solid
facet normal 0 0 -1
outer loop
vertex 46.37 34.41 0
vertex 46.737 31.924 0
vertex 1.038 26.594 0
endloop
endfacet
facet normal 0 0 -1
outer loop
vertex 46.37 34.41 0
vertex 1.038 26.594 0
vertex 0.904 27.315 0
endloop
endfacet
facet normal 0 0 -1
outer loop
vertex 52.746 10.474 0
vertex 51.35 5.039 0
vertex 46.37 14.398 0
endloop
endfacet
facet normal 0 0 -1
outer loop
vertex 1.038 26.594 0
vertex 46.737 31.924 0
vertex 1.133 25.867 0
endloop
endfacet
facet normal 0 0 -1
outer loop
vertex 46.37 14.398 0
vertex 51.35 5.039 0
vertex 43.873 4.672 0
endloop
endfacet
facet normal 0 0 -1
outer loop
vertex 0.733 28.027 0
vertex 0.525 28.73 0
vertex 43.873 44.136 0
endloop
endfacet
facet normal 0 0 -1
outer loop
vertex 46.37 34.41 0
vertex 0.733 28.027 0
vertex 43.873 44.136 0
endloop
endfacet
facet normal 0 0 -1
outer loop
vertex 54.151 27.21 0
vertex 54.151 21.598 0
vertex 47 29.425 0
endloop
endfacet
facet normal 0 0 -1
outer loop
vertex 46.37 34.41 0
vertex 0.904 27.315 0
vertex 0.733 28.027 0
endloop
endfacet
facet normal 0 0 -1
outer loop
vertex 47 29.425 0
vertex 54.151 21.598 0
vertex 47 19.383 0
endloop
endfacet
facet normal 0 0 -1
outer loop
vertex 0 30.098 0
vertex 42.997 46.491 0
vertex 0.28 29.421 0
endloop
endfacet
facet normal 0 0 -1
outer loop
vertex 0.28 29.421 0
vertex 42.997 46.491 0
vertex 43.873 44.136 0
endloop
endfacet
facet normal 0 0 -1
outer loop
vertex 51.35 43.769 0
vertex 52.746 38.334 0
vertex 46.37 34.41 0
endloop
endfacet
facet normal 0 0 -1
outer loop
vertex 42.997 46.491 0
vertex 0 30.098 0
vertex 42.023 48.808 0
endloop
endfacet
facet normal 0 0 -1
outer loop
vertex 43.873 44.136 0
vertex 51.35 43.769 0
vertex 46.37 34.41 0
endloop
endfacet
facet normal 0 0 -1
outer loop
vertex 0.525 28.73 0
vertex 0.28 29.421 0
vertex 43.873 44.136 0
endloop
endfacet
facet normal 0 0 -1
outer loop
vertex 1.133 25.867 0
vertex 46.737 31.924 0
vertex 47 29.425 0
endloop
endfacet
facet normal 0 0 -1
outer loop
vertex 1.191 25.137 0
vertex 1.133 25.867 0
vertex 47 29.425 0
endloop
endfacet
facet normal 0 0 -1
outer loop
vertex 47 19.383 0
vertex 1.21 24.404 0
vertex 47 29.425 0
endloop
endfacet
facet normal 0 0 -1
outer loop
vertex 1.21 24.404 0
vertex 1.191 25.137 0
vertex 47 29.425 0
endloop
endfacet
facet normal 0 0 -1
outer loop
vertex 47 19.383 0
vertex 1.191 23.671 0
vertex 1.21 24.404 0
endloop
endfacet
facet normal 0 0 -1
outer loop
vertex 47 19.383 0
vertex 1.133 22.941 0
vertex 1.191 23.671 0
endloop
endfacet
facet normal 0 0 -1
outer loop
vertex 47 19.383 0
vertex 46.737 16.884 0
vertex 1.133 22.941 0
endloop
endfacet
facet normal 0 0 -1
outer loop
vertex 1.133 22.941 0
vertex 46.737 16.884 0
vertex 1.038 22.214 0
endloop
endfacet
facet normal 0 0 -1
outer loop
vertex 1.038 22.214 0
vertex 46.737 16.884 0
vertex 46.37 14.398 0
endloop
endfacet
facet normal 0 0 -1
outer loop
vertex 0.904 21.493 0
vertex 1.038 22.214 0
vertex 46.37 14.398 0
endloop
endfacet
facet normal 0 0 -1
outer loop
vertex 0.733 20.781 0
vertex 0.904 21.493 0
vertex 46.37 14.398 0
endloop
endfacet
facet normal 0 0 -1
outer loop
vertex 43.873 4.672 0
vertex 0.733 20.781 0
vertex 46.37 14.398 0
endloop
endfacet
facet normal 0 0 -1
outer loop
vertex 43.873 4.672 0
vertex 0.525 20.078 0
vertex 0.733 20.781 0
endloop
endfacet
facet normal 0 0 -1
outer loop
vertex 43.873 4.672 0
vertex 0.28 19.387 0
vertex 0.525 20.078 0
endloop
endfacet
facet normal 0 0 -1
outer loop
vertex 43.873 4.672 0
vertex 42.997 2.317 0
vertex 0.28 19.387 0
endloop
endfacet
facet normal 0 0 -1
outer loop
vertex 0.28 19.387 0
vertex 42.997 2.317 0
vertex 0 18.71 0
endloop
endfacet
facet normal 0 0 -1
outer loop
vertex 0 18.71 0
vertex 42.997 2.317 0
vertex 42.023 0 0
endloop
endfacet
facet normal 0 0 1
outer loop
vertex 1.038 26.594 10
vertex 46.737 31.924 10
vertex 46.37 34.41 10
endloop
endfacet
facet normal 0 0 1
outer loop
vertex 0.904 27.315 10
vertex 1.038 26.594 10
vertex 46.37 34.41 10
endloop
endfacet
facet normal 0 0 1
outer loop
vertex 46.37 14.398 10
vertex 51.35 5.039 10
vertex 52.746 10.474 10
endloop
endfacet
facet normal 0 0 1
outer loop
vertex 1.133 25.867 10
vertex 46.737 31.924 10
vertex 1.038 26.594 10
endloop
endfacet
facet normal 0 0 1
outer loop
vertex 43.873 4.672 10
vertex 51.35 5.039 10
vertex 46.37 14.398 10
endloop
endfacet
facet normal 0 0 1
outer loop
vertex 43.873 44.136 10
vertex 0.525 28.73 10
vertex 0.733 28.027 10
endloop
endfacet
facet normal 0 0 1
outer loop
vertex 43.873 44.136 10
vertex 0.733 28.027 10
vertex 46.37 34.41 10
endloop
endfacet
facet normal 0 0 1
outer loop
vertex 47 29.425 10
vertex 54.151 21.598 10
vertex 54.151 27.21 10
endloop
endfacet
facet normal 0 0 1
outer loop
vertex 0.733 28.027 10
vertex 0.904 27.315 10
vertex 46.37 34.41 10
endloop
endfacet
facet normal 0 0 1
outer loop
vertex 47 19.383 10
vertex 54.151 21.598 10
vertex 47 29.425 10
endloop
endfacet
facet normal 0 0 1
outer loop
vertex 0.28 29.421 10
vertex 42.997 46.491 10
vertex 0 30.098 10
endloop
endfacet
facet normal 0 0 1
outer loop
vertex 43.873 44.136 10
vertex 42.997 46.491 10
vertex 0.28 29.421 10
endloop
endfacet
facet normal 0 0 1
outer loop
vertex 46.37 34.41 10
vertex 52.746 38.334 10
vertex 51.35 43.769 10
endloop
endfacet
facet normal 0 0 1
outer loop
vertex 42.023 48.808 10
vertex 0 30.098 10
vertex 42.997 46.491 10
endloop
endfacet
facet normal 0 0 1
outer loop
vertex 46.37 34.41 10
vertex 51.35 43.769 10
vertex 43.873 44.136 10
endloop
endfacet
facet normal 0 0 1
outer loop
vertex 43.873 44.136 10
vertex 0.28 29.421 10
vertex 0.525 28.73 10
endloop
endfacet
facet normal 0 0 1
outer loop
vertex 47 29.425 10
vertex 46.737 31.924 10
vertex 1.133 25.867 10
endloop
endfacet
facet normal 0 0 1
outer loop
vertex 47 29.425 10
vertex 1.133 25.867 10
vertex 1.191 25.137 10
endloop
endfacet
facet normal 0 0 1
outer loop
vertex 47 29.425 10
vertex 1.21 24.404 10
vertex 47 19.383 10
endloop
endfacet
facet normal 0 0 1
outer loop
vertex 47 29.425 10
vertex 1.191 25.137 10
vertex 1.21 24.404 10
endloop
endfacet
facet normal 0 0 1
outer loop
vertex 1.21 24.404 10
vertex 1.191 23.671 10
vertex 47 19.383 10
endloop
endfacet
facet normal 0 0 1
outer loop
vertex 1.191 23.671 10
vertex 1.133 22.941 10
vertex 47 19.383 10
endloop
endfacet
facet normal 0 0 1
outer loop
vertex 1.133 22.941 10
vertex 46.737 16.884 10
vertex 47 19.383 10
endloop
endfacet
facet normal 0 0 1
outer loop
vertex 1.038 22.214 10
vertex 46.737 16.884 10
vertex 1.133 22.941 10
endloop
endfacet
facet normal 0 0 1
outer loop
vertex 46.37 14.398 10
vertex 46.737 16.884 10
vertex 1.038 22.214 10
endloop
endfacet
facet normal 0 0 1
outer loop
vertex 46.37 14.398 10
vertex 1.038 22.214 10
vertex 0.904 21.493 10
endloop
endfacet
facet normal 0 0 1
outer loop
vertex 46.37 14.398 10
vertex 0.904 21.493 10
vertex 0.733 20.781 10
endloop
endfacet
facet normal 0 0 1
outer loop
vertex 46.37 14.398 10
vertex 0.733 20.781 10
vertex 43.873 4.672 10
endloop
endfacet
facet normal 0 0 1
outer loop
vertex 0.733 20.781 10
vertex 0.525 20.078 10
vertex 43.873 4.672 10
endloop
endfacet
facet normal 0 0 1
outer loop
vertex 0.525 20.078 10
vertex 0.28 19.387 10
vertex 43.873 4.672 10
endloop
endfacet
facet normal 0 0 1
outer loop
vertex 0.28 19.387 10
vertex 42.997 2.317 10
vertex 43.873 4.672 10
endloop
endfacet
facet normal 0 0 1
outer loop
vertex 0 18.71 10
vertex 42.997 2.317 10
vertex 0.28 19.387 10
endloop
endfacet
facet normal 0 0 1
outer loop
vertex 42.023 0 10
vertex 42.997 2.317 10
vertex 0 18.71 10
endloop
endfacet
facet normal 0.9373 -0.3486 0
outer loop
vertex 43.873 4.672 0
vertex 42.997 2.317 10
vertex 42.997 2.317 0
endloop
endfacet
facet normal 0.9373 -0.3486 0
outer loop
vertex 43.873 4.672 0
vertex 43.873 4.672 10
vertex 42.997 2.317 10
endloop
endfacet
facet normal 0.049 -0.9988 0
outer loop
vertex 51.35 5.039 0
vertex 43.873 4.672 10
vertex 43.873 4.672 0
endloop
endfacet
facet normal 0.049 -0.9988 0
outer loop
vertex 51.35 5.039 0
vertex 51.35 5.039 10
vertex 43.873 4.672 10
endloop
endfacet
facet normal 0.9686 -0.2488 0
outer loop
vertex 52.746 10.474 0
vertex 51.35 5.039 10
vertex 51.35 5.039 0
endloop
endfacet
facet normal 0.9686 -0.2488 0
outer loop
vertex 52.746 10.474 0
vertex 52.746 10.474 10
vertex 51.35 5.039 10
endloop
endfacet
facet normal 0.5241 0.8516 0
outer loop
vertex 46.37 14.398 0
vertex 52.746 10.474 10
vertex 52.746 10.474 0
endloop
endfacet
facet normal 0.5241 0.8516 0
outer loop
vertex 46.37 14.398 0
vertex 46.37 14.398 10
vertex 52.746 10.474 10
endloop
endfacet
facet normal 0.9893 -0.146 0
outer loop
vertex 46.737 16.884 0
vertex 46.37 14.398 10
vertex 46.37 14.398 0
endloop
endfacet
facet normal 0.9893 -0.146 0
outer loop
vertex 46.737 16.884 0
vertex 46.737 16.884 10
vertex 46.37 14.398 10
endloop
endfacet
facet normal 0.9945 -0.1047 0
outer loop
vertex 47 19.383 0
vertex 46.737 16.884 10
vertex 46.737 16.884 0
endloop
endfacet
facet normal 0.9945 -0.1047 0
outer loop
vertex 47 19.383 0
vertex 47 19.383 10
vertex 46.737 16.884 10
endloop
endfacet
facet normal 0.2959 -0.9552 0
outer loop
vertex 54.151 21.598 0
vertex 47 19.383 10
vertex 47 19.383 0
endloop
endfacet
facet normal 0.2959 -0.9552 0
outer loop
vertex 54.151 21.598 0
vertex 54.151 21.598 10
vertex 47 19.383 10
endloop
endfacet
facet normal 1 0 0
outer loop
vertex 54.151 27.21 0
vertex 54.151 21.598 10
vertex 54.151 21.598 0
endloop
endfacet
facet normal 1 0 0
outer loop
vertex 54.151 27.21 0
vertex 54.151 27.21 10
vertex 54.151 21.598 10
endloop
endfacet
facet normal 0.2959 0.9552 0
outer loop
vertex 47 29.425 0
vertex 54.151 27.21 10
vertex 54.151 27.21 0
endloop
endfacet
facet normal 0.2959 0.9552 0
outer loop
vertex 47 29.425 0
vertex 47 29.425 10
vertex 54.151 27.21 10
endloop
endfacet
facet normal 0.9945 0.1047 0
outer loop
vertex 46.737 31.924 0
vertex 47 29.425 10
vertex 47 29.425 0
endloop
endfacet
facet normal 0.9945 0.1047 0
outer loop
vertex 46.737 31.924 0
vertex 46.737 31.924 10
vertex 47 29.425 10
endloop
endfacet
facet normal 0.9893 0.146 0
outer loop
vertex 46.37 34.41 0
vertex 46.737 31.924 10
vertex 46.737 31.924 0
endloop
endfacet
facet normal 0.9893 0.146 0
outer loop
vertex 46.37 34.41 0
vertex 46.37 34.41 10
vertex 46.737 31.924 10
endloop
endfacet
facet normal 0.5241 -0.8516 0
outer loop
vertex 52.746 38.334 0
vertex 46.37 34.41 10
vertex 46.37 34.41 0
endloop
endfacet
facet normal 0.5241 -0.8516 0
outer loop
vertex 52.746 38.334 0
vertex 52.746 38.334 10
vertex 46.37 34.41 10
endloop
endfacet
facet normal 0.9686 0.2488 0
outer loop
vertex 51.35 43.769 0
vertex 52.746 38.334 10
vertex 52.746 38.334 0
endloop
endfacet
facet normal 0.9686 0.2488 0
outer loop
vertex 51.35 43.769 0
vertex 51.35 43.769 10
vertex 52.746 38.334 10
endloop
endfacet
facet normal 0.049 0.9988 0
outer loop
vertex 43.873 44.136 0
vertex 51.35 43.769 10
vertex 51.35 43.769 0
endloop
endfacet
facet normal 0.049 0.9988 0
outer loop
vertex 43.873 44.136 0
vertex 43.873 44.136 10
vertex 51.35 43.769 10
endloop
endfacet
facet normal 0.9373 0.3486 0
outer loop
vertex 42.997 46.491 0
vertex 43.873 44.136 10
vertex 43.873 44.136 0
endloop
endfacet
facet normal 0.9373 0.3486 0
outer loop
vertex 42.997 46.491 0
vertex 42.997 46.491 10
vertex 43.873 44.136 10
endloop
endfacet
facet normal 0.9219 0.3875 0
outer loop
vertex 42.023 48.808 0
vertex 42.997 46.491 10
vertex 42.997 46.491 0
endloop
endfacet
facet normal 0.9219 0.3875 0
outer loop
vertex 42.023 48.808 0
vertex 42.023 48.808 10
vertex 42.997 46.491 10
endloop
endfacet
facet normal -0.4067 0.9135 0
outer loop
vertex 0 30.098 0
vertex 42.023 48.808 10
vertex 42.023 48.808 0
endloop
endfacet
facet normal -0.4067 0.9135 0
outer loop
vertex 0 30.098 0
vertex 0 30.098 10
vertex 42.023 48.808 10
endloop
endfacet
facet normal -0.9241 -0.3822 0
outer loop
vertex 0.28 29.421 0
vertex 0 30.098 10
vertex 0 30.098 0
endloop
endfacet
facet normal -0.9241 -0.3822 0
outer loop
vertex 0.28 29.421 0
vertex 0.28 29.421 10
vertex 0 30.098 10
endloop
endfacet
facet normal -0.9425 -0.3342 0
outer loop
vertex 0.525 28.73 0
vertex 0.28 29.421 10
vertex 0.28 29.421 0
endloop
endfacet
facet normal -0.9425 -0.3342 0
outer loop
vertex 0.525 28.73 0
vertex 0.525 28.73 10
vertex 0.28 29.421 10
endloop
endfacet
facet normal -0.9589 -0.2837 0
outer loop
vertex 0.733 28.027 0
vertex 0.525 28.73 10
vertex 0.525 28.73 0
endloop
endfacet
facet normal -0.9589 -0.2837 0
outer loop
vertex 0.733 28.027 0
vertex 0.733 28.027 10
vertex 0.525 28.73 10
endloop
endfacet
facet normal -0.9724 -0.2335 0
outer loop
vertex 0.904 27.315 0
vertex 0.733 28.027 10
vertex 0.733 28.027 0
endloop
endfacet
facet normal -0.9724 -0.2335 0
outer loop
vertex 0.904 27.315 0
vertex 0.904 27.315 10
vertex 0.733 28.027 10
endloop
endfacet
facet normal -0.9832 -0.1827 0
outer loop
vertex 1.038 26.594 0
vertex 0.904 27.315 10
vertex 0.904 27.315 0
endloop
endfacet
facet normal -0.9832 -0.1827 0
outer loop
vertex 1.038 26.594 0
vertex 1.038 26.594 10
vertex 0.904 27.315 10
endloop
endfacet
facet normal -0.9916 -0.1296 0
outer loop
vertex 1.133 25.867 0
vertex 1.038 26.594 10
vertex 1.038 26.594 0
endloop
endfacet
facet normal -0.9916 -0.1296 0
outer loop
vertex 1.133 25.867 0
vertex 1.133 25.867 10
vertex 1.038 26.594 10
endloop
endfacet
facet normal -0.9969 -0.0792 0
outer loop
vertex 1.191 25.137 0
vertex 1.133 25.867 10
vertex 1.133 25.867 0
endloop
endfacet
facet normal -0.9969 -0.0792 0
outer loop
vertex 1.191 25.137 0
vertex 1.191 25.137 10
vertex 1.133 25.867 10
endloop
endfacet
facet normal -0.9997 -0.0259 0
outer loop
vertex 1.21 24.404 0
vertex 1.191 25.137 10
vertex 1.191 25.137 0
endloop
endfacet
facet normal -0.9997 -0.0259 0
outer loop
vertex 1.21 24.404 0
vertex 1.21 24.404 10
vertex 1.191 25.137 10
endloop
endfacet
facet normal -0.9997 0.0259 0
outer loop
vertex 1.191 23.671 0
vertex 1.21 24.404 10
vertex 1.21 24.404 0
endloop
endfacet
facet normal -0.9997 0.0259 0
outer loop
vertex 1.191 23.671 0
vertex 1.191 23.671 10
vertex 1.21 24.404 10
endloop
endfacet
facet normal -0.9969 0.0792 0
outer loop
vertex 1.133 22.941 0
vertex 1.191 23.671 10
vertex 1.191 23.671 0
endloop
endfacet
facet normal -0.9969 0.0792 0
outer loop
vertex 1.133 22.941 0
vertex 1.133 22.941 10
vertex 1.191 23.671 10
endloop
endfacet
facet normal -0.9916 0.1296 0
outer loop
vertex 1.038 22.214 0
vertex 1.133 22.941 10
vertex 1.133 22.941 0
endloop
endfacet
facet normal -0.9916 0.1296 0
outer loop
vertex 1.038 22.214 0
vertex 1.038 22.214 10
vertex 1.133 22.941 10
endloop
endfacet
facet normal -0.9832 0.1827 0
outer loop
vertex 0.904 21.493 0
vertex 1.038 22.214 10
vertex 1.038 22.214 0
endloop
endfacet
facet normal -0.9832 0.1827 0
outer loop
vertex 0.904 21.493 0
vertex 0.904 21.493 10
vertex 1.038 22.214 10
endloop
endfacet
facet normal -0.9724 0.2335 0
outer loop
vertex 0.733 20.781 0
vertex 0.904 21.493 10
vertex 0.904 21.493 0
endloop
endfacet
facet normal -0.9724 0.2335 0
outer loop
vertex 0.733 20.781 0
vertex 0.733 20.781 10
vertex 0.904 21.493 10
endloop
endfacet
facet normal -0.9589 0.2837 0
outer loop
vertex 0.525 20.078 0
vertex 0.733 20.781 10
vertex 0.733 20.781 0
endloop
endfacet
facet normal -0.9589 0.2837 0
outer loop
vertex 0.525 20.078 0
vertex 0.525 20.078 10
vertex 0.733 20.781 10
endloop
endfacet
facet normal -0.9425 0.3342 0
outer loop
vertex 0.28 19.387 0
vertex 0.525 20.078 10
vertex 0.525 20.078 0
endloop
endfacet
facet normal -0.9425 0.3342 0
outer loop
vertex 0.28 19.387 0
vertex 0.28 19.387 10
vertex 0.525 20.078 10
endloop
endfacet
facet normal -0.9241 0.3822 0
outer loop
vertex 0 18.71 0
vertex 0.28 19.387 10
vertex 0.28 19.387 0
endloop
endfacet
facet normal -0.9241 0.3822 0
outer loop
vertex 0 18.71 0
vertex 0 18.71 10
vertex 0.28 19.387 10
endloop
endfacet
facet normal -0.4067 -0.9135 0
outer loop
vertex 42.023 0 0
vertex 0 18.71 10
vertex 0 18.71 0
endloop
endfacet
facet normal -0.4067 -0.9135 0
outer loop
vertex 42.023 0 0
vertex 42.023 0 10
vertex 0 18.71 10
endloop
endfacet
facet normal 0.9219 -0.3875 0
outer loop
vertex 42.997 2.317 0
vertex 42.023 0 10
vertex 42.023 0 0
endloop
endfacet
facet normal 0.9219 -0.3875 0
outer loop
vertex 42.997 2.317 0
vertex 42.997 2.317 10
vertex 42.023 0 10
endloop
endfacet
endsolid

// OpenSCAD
$fn = 32;

// ----------------------------------------------------------------------
// Gear sector: 3 teeth on 48 degrees
// ----------------------------------------------------------------------

// --- parameters (mm) ---
sector_angle = 48;        // sector angle, degrees
root_r = 60;              // root circle radius
tooth_h = 7;              // tooth height over the root circle
teeth = 3;                // number of teeth on the sector
hub_r = 14;               // hub bore radius
plate_t = 10;             // sector thickness, Z
arc_step = 3;             // sampling step of the root/hub arcs, degrees

tip_r = root_r + tooth_h;  // tip circle radius

profile = [[42.023, 0], [42.997, 2.317], [43.873, 4.672], [51.35, 5.039], [52.746, 10.474], [46.37, 14.398], [46.737, 16.884], [47, 19.383], [54.151, 21.598], [54.151, 27.21], [47, 29.425], [46.737, 31.924], [46.37, 34.41], [52.746, 38.334], [51.35, 43.769], [43.873, 44.136], [42.997, 46.491], [42.023, 48.808], [0, 30.098], [0.28, 29.421], [0.525, 28.73], [0.733, 28.027], [0.904, 27.315], [1.038, 26.594], [1.133, 25.867], [1.191, 25.137], [1.21, 24.404], [1.191, 23.671], [1.133, 22.941], [1.038, 22.214], [0.904, 21.493], [0.733, 20.781], [0.525, 20.078], [0.28, 19.387], [0, 18.71]];  // primary outline, 35 points, counter clockwise

// --- the one profile operation ---
linear_extrude(height = plate_t) polygon(points = profile);
